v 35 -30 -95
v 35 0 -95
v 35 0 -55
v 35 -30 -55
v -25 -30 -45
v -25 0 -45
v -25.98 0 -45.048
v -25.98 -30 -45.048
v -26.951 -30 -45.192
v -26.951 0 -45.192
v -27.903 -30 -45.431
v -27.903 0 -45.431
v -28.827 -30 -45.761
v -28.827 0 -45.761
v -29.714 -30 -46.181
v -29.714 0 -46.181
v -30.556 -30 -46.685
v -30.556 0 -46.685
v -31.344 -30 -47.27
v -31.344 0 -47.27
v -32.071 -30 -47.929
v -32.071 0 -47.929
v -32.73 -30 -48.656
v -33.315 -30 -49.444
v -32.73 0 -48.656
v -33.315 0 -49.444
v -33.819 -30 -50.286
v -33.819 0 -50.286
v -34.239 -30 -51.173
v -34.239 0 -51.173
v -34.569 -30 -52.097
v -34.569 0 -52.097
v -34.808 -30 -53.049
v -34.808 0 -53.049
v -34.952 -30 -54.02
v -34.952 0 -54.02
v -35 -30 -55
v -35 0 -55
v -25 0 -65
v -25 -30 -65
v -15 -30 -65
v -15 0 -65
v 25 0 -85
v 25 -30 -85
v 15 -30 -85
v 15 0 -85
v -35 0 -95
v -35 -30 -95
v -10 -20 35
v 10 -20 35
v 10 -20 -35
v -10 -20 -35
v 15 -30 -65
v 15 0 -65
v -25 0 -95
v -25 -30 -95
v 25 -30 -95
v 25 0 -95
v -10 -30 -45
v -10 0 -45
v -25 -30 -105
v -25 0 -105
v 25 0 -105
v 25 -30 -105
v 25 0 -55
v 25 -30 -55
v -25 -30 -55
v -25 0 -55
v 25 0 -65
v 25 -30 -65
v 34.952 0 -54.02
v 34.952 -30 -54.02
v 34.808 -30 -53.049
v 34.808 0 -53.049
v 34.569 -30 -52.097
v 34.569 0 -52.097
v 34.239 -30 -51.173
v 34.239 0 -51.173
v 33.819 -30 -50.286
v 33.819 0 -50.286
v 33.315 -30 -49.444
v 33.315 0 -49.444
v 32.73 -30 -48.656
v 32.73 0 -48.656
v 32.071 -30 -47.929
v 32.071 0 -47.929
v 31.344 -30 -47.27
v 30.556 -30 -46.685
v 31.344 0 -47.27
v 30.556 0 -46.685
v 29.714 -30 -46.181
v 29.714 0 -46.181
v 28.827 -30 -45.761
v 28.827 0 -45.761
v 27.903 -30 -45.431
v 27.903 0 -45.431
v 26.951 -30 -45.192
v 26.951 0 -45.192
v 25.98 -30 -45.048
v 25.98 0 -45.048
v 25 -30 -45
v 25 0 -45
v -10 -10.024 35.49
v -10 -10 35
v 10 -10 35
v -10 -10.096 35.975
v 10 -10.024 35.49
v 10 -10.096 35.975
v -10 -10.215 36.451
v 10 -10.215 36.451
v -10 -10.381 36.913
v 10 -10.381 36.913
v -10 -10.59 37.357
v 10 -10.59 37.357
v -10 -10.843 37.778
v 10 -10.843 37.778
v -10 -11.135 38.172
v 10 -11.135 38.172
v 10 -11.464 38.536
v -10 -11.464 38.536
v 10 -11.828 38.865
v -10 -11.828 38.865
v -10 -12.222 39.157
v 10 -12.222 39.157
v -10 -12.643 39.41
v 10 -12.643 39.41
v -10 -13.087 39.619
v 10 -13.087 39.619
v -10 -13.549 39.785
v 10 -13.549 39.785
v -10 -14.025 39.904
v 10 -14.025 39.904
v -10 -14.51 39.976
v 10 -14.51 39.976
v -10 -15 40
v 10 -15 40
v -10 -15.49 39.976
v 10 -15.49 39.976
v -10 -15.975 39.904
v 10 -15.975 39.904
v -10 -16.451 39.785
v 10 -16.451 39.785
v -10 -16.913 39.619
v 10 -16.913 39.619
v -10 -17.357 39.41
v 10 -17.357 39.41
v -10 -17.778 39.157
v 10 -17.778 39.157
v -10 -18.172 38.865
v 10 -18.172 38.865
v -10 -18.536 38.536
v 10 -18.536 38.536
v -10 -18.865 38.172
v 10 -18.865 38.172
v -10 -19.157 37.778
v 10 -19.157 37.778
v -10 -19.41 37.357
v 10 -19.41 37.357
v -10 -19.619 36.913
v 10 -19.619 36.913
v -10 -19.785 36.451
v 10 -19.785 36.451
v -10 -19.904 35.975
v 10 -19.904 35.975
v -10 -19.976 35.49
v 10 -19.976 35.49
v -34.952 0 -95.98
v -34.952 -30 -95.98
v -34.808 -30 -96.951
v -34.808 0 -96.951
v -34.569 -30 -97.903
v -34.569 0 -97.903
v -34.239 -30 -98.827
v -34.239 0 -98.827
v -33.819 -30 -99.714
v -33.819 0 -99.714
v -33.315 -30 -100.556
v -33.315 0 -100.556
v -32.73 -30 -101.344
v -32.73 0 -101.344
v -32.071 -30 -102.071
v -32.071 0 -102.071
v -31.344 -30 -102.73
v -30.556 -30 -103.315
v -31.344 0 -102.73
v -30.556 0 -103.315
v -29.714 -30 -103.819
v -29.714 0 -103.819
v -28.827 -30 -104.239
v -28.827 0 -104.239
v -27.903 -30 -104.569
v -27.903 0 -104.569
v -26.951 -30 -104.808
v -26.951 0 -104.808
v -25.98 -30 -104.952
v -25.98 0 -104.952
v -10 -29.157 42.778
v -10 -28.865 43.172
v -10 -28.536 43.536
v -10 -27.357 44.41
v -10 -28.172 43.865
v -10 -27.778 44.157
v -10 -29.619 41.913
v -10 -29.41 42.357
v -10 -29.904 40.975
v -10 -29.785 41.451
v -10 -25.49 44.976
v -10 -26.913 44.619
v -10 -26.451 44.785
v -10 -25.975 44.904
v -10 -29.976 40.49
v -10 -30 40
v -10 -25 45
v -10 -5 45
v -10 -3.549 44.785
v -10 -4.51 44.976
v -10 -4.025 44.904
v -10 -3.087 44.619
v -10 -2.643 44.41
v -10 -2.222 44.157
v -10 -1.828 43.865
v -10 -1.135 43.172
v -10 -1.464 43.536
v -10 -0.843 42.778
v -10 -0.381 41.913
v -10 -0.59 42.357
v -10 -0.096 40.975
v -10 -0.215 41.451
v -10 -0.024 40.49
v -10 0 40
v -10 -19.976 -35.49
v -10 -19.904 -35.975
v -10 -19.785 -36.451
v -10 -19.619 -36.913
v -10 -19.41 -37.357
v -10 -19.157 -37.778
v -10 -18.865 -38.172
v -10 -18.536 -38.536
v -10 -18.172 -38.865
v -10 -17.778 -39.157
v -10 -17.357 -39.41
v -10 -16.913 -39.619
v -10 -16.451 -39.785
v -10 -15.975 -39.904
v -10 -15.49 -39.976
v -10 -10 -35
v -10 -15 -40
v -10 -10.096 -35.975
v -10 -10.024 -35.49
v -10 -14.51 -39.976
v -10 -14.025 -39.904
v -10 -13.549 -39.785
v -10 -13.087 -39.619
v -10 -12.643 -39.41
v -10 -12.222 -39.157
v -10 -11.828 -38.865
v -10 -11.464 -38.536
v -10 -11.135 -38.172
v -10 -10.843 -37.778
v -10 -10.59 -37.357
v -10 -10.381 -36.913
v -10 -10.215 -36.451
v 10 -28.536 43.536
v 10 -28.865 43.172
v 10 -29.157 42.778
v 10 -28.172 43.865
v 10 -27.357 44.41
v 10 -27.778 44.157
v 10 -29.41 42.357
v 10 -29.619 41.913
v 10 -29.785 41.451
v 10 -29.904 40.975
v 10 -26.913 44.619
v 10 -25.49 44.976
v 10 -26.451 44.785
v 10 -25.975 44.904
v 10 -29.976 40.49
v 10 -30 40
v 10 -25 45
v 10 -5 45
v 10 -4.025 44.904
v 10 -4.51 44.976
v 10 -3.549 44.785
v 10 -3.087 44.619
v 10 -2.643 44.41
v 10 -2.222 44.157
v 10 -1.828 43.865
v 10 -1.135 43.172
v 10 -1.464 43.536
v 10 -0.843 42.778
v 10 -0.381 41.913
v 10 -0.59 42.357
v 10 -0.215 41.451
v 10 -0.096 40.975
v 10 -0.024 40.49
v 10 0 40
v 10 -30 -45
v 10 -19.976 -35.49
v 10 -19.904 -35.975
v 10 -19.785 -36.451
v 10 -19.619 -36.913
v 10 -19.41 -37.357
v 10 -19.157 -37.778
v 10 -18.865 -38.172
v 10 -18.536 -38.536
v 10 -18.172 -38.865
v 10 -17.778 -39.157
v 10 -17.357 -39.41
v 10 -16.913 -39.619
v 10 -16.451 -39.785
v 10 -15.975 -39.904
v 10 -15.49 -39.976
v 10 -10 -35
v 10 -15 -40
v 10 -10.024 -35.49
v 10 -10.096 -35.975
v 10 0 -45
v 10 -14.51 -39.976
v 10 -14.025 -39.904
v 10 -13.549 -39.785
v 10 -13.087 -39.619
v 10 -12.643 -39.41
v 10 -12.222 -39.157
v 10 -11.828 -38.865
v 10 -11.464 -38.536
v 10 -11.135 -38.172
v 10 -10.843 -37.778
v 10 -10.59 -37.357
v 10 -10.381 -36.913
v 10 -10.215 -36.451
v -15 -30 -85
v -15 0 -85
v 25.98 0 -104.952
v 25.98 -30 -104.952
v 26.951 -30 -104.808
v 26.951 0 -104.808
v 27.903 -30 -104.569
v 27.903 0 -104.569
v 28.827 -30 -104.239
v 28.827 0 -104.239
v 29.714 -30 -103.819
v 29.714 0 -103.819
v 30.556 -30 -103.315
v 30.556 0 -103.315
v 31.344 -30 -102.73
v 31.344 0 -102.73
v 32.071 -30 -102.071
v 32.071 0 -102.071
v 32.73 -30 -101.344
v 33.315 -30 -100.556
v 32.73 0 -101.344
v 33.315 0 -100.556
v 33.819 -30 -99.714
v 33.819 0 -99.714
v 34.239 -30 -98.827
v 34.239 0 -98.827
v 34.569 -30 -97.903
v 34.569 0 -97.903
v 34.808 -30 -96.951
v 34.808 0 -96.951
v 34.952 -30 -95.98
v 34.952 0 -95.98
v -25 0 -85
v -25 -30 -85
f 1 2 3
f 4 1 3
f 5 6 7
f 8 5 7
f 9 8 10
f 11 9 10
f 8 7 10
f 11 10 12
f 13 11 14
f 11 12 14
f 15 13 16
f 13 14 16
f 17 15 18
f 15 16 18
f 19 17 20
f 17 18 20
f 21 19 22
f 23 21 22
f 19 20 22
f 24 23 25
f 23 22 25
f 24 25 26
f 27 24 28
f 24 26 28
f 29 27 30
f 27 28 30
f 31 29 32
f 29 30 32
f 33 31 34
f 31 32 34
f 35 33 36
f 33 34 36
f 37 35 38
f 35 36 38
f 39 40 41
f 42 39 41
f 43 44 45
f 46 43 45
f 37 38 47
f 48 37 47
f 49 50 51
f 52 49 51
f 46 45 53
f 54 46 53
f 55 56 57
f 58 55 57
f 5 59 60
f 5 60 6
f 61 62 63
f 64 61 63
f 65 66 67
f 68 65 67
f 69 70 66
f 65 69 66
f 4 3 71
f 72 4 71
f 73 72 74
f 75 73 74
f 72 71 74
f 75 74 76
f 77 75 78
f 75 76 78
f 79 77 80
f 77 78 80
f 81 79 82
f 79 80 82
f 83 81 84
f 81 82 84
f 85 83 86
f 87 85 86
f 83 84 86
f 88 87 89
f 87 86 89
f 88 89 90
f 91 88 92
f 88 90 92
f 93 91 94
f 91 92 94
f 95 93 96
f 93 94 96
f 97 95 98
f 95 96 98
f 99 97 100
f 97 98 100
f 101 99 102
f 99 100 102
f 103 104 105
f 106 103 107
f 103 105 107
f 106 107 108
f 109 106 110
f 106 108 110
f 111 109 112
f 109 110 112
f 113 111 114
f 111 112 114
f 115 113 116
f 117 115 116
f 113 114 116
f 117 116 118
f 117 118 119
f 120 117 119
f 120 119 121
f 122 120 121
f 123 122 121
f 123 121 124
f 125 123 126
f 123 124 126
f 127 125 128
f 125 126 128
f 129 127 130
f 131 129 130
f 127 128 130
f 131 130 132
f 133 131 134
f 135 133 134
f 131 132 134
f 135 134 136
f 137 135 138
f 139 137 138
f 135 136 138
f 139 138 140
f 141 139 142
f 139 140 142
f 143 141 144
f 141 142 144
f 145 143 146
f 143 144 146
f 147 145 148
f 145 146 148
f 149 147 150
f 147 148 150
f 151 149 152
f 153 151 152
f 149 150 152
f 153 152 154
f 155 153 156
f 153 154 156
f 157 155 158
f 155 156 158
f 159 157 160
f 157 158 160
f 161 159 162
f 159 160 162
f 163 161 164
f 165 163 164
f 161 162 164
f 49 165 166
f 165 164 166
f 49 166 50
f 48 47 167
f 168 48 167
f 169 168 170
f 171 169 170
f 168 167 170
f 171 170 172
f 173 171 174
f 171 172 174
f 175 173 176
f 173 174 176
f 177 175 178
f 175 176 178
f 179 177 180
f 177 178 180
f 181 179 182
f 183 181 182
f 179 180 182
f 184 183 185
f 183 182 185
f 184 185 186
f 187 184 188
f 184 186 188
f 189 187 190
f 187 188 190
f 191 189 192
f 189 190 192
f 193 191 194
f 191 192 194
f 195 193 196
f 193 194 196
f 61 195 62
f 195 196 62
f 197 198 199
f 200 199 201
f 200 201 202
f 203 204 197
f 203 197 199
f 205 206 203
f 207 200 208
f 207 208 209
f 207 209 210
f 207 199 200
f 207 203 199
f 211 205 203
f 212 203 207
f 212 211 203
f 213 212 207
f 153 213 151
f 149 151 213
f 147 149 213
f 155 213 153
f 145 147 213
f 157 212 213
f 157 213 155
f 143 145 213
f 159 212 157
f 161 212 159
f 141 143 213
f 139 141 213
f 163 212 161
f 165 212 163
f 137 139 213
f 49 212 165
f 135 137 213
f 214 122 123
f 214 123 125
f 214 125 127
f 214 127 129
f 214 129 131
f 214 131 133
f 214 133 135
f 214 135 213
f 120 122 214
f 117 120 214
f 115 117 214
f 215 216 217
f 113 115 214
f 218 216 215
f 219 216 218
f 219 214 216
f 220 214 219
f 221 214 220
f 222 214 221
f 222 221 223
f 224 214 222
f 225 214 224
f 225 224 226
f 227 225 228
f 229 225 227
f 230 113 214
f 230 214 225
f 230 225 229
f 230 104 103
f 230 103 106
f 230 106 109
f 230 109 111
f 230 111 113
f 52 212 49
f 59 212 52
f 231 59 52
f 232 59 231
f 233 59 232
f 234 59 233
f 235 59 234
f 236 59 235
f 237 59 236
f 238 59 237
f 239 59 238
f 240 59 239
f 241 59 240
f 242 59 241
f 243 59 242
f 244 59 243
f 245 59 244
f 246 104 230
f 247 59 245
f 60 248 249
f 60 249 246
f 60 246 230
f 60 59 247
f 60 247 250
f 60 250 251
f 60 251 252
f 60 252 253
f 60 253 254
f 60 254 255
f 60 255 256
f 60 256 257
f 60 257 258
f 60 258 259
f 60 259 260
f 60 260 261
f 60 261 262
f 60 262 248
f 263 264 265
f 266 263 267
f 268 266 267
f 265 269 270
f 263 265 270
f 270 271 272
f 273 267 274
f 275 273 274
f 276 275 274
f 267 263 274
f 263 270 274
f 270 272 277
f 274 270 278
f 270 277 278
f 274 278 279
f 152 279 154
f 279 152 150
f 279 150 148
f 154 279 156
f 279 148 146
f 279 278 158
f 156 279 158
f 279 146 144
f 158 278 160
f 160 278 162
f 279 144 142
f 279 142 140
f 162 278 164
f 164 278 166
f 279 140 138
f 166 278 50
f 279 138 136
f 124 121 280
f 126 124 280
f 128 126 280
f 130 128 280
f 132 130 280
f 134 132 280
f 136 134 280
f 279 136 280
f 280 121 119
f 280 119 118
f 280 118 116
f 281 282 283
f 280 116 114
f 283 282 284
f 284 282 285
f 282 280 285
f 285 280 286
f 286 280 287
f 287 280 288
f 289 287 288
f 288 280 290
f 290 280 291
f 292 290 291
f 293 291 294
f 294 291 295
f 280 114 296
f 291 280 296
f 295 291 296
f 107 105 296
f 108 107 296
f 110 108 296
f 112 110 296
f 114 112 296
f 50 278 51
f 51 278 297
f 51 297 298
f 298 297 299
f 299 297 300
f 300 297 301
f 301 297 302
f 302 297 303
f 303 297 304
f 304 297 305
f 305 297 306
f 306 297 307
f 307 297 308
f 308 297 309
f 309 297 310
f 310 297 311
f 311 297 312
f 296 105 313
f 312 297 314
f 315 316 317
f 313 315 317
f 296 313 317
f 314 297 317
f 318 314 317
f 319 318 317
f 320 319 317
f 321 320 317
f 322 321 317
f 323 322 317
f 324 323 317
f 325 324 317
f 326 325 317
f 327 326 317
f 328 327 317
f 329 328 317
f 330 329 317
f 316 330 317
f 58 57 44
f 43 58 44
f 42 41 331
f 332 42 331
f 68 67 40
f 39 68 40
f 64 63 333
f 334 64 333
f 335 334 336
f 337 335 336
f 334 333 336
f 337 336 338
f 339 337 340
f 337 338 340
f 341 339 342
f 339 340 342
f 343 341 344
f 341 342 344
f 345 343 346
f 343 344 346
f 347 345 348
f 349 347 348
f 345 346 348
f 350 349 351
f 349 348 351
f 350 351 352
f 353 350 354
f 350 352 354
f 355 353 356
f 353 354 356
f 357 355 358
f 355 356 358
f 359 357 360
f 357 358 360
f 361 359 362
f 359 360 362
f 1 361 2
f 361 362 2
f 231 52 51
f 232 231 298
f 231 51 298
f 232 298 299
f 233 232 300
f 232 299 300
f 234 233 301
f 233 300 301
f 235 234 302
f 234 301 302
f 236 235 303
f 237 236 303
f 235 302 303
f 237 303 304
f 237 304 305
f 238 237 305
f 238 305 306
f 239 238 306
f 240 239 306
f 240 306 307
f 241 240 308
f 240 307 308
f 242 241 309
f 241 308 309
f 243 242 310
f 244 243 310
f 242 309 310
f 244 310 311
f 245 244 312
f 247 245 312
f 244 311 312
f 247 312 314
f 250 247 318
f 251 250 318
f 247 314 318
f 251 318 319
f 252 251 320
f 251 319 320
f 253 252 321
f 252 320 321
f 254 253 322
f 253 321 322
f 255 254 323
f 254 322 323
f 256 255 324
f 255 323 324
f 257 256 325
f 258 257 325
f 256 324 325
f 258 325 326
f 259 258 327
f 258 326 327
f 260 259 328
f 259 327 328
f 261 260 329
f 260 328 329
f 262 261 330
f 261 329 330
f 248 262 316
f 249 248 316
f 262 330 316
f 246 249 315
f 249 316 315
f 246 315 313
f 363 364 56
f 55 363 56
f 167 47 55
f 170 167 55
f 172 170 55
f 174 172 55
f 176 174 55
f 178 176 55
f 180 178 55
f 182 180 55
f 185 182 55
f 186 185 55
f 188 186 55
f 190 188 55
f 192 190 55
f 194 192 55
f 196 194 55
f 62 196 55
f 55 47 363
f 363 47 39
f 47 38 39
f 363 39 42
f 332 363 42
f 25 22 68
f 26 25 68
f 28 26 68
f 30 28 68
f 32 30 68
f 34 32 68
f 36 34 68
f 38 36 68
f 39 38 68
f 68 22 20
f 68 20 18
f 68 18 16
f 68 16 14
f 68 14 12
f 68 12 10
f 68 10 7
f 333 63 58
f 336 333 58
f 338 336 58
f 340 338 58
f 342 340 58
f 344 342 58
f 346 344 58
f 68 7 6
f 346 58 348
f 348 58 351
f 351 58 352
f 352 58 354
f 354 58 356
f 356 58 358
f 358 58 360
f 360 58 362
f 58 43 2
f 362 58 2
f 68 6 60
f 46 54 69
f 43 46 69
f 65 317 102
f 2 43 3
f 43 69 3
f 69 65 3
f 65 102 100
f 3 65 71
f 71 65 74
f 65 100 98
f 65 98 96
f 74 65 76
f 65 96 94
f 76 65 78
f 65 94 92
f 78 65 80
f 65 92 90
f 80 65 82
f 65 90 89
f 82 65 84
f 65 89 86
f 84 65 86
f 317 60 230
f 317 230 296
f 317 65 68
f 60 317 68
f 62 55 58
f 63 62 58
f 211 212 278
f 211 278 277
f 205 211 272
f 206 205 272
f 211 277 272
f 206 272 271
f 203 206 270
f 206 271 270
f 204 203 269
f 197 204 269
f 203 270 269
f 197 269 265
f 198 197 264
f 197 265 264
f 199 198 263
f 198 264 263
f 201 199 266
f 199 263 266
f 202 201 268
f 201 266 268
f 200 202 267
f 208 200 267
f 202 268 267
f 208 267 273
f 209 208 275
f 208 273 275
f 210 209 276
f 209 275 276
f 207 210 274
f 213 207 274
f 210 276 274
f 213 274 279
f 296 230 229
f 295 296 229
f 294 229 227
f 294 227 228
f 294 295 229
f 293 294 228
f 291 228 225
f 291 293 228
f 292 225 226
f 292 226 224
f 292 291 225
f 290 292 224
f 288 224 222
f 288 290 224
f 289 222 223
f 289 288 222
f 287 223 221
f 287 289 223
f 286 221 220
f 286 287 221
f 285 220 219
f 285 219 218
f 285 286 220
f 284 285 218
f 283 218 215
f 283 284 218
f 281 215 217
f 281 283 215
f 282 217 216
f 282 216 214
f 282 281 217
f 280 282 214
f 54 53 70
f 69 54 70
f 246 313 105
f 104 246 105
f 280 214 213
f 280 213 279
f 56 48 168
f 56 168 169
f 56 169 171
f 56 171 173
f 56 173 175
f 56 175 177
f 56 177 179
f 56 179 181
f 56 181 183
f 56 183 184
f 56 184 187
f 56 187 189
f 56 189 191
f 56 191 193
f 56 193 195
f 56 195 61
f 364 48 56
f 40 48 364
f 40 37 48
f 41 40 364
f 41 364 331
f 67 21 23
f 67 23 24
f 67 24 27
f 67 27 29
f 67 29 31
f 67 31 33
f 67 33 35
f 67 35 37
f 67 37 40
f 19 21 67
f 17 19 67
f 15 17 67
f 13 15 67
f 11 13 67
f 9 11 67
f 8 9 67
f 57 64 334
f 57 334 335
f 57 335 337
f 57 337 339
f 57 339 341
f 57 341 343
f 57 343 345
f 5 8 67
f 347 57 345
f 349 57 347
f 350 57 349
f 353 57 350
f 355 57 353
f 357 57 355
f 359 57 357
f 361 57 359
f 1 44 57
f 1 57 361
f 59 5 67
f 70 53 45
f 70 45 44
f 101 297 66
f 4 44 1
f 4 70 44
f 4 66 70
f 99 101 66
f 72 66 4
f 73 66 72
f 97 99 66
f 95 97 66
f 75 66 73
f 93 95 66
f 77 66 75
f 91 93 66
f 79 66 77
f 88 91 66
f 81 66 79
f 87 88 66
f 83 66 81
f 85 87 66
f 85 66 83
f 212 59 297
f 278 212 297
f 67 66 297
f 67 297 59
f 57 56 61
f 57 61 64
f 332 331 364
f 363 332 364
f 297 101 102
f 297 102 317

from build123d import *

# Parameters (mm, degrees)
F1_DEPTH      = 30
F3_DEPTH      = 25
F3_DEPTH_BACK = 40
F5_W          = 20
F5_H          = 30
F6_DEPTH      = 90
F7_R          = 5
F9_DEPTH      = 25
F9_DEPTH_BACK = 40


with BuildPart() as f1:
    # F0 (on Front) → F1 (new body)
    with BuildSketch(Plane.XZ):
        with BuildLine():
            Line((10, -45), (-10, -45))
            Line((-10, -45), (-25, -45))
            ThreePointArc((-25, -45), (-32.071068, -47.928932), (-35, -55))
            Line((-35, -55), (-35, -95))
            ThreePointArc((-35, -95), (-32.071068, -102.071068), (-25, -105))
            Line((-25, -105), (25, -105))
            ThreePointArc((25, -105), (32.071068, -102.071068), (35, -95))
            Line((35, -95), (35, -55))
            ThreePointArc((35, -55), (32.071068, -47.928932), (25, -45))
            Line((25, -45), (10, -45))
        make_face()
    extrude(amount=F1_DEPTH)


with BuildPart() as f3:
    # F2 (on face) → F3 (new body, two sides)
    with BuildSketch(Plane.XZ.offset(30)) as f3_sk:
        Polygon((25, -55), (-25, -55), (-25, -65), (-15, -65), (-15, -85), (-25, -85), (-25, -95), (25, -95), (25, -85), (15, -85), (15, -65), (25, -65), align=None)
    extrude(amount=F3_DEPTH)
    extrude(f3_sk.sketch, amount=-F3_DEPTH_BACK)


with BuildPart() as f1_1:
    add(f1.part)

    # F4: cut F3
    add(f3.part, mode=Mode.SUBTRACT)

    # F5 (on face) → F6 (join)
    with BuildSketch(Plane.XY.offset(-45)):
        with Locations((0, -15)):
            Rectangle(F5_W, F5_H)
    extrude(amount=F6_DEPTH)

    # F7
    f7_edges = [f1_1.edges().sort_by_distance(p)[0] for p in [
        (0, -30, 45),
        (0, 0, 45),
    ]]
    fillet(f7_edges, radius=F7_R)


with BuildPart() as f9:
    # F8 (on face) → F9 (new body, two sides)
    with BuildSketch(Plane.YZ.offset(10)) as f9_sk:
        with BuildLine():
            Line((-10, -35), (-10, 35))
            ThreePointArc((-10, 35), (-15, 40), (-20, 35))
            Line((-20, 35), (-20, -35))
            ThreePointArc((-20, -35), (-15, -40), (-10, -35))
        make_face()
    extrude(amount=F9_DEPTH)
    extrude(f9_sk.sketch, amount=-F9_DEPTH_BACK)


with BuildPart() as f1_2:
    add(f1_1.part)

    # F10: cut F9
    add(f9.part, mode=Mode.SUBTRACT)


solid = f1_2.part
